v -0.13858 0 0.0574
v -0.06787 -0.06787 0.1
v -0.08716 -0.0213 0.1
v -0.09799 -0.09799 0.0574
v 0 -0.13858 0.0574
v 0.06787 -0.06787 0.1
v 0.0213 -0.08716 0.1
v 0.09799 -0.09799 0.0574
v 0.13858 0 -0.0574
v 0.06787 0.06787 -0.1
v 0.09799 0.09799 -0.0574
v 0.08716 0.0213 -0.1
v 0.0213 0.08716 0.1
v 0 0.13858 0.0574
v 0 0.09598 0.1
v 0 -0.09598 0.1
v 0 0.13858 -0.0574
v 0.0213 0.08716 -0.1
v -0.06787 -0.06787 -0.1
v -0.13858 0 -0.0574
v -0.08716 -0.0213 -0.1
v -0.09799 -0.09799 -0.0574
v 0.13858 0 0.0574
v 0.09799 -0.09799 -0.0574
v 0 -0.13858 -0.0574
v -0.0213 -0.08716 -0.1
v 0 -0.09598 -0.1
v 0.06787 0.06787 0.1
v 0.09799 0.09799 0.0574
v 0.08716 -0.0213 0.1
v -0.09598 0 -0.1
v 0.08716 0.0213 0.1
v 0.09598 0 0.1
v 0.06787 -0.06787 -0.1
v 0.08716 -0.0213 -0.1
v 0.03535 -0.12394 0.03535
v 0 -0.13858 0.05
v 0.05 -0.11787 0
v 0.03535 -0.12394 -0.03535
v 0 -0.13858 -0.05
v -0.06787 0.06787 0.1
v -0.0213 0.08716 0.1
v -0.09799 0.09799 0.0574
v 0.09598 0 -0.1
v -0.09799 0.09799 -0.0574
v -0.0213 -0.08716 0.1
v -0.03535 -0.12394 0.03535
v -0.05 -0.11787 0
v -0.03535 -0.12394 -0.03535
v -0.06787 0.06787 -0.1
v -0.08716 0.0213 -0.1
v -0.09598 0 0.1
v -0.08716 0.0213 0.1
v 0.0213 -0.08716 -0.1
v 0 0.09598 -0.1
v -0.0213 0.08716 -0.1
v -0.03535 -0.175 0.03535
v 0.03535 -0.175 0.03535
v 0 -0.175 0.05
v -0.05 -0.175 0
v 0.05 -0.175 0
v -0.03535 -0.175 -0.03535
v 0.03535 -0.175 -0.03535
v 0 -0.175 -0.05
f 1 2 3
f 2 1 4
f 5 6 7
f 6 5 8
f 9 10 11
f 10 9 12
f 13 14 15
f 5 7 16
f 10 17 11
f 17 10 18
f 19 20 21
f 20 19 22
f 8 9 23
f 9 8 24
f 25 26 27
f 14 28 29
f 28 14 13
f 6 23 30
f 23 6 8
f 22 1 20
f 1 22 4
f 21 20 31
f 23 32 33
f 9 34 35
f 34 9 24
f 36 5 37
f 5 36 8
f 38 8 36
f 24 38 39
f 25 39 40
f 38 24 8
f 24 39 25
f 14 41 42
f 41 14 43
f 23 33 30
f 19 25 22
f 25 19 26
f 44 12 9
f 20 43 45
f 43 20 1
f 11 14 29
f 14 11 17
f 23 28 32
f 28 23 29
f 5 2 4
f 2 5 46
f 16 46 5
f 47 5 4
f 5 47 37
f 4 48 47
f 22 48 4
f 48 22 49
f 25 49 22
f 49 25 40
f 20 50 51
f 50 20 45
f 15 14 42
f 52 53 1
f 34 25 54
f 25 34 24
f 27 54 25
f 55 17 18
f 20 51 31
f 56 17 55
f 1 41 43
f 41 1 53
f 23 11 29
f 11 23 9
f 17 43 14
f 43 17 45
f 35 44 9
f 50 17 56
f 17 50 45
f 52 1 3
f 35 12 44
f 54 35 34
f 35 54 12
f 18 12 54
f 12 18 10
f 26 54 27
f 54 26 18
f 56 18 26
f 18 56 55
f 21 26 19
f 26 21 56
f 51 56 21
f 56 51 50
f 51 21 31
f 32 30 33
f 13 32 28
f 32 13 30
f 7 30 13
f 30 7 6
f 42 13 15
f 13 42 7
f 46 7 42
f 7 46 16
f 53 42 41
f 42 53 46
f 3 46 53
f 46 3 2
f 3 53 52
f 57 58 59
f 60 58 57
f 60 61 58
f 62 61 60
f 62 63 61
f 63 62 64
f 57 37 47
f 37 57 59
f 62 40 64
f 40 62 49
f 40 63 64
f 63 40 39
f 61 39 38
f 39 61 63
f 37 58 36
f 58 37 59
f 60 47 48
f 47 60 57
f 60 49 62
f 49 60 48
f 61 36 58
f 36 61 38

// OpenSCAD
// file: lib.scad
function x(v) = v[0];
function y(v) = v[1];
function z(v) = v[2];
function add(v1,v2) = [ for (i = [ 0 : len(v1)-1 ]) v1[i] + v2[i] ];
function xv(d) = [d,0,0];
function yv(d) = [0,d,0];
function zv(d) = [0,0,d];

module box(v) { cube(size=v, center=true); }
module cyl(r1,r2,h) { cylinder(r1=r1, r2=r2, h=h, center=true); }

function grow(n,v) = [x(v)+n*2, y(v)+n*2, z(v)+n*2];

module rbox(v, radius=1) {
	cx = x(v)/2-radius;
	cy = y(v)/2-radius;
	cz = z(v)/2-radius;

	hull() {
		translate([cx,cy,cz]) sphere(r=radius);
		translate([cx,cy,-cz]) sphere(r=radius);
		translate([cx,-cy,cz]) sphere(r=radius);
		translate([cx,-cy,-cz]) sphere(r=radius);
		translate([-cx,cy,cz]) sphere(r=radius);
		translate([-cx,cy,-cz]) sphere(r=radius);
		translate([-cx,-cy,cz]) sphere(r=radius);
		translate([-cx,-cy,-cz]) sphere(r=radius);
	}
}

module fillet(r=1) {
  minkowski() {
    difference() {
      children();
      minkowski() {
        difference() {
          minkowski() {
            children();
            sphere(r=r);
          }
          children();
        }
        sphere(r=r);
      }
    }
    sphere(r=r);
  }
}
// main file
use <lib.scad>

bounds = [1,1,1];
body = [0.9, 0.9, 0.9];

module blade() {
	translate([0.1,0,0.03]) rotate([30,0,0]) scale([3,1,1]) cyl(0.03, 0.03, 0.01);
}

module rotor() {
	translate([0,0,0.01]) union() {
		cyl(0.03, 0.03, 0.1);
		blade();
		rotate([0,0,180]) blade();
	}
}

module spars() {
	union() {
		rotate([0,90,0]) cyl(0.02, 0.02, 0.8);
		rotate([90,0,0]) cyl(0.02, 0.02, 0.8);
	}
}

module chassis() {
	union() {
		difference() {
			sphere(r=0.15);
			translate([0,0,-0.35]) box([0.5,0.5,0.5]);
			translate([0,0,0.35]) box([0.5,0.5,0.5]);
		}
		rotate([0,90,0]) translate([0,0,0.05]) cyl(0.05, 0.05, 0.25);
	}
}



d = 8;

rotate([0,0,-90]) chassis($fn=d);
//spars($fn=d);
//rotor($fn=d);
